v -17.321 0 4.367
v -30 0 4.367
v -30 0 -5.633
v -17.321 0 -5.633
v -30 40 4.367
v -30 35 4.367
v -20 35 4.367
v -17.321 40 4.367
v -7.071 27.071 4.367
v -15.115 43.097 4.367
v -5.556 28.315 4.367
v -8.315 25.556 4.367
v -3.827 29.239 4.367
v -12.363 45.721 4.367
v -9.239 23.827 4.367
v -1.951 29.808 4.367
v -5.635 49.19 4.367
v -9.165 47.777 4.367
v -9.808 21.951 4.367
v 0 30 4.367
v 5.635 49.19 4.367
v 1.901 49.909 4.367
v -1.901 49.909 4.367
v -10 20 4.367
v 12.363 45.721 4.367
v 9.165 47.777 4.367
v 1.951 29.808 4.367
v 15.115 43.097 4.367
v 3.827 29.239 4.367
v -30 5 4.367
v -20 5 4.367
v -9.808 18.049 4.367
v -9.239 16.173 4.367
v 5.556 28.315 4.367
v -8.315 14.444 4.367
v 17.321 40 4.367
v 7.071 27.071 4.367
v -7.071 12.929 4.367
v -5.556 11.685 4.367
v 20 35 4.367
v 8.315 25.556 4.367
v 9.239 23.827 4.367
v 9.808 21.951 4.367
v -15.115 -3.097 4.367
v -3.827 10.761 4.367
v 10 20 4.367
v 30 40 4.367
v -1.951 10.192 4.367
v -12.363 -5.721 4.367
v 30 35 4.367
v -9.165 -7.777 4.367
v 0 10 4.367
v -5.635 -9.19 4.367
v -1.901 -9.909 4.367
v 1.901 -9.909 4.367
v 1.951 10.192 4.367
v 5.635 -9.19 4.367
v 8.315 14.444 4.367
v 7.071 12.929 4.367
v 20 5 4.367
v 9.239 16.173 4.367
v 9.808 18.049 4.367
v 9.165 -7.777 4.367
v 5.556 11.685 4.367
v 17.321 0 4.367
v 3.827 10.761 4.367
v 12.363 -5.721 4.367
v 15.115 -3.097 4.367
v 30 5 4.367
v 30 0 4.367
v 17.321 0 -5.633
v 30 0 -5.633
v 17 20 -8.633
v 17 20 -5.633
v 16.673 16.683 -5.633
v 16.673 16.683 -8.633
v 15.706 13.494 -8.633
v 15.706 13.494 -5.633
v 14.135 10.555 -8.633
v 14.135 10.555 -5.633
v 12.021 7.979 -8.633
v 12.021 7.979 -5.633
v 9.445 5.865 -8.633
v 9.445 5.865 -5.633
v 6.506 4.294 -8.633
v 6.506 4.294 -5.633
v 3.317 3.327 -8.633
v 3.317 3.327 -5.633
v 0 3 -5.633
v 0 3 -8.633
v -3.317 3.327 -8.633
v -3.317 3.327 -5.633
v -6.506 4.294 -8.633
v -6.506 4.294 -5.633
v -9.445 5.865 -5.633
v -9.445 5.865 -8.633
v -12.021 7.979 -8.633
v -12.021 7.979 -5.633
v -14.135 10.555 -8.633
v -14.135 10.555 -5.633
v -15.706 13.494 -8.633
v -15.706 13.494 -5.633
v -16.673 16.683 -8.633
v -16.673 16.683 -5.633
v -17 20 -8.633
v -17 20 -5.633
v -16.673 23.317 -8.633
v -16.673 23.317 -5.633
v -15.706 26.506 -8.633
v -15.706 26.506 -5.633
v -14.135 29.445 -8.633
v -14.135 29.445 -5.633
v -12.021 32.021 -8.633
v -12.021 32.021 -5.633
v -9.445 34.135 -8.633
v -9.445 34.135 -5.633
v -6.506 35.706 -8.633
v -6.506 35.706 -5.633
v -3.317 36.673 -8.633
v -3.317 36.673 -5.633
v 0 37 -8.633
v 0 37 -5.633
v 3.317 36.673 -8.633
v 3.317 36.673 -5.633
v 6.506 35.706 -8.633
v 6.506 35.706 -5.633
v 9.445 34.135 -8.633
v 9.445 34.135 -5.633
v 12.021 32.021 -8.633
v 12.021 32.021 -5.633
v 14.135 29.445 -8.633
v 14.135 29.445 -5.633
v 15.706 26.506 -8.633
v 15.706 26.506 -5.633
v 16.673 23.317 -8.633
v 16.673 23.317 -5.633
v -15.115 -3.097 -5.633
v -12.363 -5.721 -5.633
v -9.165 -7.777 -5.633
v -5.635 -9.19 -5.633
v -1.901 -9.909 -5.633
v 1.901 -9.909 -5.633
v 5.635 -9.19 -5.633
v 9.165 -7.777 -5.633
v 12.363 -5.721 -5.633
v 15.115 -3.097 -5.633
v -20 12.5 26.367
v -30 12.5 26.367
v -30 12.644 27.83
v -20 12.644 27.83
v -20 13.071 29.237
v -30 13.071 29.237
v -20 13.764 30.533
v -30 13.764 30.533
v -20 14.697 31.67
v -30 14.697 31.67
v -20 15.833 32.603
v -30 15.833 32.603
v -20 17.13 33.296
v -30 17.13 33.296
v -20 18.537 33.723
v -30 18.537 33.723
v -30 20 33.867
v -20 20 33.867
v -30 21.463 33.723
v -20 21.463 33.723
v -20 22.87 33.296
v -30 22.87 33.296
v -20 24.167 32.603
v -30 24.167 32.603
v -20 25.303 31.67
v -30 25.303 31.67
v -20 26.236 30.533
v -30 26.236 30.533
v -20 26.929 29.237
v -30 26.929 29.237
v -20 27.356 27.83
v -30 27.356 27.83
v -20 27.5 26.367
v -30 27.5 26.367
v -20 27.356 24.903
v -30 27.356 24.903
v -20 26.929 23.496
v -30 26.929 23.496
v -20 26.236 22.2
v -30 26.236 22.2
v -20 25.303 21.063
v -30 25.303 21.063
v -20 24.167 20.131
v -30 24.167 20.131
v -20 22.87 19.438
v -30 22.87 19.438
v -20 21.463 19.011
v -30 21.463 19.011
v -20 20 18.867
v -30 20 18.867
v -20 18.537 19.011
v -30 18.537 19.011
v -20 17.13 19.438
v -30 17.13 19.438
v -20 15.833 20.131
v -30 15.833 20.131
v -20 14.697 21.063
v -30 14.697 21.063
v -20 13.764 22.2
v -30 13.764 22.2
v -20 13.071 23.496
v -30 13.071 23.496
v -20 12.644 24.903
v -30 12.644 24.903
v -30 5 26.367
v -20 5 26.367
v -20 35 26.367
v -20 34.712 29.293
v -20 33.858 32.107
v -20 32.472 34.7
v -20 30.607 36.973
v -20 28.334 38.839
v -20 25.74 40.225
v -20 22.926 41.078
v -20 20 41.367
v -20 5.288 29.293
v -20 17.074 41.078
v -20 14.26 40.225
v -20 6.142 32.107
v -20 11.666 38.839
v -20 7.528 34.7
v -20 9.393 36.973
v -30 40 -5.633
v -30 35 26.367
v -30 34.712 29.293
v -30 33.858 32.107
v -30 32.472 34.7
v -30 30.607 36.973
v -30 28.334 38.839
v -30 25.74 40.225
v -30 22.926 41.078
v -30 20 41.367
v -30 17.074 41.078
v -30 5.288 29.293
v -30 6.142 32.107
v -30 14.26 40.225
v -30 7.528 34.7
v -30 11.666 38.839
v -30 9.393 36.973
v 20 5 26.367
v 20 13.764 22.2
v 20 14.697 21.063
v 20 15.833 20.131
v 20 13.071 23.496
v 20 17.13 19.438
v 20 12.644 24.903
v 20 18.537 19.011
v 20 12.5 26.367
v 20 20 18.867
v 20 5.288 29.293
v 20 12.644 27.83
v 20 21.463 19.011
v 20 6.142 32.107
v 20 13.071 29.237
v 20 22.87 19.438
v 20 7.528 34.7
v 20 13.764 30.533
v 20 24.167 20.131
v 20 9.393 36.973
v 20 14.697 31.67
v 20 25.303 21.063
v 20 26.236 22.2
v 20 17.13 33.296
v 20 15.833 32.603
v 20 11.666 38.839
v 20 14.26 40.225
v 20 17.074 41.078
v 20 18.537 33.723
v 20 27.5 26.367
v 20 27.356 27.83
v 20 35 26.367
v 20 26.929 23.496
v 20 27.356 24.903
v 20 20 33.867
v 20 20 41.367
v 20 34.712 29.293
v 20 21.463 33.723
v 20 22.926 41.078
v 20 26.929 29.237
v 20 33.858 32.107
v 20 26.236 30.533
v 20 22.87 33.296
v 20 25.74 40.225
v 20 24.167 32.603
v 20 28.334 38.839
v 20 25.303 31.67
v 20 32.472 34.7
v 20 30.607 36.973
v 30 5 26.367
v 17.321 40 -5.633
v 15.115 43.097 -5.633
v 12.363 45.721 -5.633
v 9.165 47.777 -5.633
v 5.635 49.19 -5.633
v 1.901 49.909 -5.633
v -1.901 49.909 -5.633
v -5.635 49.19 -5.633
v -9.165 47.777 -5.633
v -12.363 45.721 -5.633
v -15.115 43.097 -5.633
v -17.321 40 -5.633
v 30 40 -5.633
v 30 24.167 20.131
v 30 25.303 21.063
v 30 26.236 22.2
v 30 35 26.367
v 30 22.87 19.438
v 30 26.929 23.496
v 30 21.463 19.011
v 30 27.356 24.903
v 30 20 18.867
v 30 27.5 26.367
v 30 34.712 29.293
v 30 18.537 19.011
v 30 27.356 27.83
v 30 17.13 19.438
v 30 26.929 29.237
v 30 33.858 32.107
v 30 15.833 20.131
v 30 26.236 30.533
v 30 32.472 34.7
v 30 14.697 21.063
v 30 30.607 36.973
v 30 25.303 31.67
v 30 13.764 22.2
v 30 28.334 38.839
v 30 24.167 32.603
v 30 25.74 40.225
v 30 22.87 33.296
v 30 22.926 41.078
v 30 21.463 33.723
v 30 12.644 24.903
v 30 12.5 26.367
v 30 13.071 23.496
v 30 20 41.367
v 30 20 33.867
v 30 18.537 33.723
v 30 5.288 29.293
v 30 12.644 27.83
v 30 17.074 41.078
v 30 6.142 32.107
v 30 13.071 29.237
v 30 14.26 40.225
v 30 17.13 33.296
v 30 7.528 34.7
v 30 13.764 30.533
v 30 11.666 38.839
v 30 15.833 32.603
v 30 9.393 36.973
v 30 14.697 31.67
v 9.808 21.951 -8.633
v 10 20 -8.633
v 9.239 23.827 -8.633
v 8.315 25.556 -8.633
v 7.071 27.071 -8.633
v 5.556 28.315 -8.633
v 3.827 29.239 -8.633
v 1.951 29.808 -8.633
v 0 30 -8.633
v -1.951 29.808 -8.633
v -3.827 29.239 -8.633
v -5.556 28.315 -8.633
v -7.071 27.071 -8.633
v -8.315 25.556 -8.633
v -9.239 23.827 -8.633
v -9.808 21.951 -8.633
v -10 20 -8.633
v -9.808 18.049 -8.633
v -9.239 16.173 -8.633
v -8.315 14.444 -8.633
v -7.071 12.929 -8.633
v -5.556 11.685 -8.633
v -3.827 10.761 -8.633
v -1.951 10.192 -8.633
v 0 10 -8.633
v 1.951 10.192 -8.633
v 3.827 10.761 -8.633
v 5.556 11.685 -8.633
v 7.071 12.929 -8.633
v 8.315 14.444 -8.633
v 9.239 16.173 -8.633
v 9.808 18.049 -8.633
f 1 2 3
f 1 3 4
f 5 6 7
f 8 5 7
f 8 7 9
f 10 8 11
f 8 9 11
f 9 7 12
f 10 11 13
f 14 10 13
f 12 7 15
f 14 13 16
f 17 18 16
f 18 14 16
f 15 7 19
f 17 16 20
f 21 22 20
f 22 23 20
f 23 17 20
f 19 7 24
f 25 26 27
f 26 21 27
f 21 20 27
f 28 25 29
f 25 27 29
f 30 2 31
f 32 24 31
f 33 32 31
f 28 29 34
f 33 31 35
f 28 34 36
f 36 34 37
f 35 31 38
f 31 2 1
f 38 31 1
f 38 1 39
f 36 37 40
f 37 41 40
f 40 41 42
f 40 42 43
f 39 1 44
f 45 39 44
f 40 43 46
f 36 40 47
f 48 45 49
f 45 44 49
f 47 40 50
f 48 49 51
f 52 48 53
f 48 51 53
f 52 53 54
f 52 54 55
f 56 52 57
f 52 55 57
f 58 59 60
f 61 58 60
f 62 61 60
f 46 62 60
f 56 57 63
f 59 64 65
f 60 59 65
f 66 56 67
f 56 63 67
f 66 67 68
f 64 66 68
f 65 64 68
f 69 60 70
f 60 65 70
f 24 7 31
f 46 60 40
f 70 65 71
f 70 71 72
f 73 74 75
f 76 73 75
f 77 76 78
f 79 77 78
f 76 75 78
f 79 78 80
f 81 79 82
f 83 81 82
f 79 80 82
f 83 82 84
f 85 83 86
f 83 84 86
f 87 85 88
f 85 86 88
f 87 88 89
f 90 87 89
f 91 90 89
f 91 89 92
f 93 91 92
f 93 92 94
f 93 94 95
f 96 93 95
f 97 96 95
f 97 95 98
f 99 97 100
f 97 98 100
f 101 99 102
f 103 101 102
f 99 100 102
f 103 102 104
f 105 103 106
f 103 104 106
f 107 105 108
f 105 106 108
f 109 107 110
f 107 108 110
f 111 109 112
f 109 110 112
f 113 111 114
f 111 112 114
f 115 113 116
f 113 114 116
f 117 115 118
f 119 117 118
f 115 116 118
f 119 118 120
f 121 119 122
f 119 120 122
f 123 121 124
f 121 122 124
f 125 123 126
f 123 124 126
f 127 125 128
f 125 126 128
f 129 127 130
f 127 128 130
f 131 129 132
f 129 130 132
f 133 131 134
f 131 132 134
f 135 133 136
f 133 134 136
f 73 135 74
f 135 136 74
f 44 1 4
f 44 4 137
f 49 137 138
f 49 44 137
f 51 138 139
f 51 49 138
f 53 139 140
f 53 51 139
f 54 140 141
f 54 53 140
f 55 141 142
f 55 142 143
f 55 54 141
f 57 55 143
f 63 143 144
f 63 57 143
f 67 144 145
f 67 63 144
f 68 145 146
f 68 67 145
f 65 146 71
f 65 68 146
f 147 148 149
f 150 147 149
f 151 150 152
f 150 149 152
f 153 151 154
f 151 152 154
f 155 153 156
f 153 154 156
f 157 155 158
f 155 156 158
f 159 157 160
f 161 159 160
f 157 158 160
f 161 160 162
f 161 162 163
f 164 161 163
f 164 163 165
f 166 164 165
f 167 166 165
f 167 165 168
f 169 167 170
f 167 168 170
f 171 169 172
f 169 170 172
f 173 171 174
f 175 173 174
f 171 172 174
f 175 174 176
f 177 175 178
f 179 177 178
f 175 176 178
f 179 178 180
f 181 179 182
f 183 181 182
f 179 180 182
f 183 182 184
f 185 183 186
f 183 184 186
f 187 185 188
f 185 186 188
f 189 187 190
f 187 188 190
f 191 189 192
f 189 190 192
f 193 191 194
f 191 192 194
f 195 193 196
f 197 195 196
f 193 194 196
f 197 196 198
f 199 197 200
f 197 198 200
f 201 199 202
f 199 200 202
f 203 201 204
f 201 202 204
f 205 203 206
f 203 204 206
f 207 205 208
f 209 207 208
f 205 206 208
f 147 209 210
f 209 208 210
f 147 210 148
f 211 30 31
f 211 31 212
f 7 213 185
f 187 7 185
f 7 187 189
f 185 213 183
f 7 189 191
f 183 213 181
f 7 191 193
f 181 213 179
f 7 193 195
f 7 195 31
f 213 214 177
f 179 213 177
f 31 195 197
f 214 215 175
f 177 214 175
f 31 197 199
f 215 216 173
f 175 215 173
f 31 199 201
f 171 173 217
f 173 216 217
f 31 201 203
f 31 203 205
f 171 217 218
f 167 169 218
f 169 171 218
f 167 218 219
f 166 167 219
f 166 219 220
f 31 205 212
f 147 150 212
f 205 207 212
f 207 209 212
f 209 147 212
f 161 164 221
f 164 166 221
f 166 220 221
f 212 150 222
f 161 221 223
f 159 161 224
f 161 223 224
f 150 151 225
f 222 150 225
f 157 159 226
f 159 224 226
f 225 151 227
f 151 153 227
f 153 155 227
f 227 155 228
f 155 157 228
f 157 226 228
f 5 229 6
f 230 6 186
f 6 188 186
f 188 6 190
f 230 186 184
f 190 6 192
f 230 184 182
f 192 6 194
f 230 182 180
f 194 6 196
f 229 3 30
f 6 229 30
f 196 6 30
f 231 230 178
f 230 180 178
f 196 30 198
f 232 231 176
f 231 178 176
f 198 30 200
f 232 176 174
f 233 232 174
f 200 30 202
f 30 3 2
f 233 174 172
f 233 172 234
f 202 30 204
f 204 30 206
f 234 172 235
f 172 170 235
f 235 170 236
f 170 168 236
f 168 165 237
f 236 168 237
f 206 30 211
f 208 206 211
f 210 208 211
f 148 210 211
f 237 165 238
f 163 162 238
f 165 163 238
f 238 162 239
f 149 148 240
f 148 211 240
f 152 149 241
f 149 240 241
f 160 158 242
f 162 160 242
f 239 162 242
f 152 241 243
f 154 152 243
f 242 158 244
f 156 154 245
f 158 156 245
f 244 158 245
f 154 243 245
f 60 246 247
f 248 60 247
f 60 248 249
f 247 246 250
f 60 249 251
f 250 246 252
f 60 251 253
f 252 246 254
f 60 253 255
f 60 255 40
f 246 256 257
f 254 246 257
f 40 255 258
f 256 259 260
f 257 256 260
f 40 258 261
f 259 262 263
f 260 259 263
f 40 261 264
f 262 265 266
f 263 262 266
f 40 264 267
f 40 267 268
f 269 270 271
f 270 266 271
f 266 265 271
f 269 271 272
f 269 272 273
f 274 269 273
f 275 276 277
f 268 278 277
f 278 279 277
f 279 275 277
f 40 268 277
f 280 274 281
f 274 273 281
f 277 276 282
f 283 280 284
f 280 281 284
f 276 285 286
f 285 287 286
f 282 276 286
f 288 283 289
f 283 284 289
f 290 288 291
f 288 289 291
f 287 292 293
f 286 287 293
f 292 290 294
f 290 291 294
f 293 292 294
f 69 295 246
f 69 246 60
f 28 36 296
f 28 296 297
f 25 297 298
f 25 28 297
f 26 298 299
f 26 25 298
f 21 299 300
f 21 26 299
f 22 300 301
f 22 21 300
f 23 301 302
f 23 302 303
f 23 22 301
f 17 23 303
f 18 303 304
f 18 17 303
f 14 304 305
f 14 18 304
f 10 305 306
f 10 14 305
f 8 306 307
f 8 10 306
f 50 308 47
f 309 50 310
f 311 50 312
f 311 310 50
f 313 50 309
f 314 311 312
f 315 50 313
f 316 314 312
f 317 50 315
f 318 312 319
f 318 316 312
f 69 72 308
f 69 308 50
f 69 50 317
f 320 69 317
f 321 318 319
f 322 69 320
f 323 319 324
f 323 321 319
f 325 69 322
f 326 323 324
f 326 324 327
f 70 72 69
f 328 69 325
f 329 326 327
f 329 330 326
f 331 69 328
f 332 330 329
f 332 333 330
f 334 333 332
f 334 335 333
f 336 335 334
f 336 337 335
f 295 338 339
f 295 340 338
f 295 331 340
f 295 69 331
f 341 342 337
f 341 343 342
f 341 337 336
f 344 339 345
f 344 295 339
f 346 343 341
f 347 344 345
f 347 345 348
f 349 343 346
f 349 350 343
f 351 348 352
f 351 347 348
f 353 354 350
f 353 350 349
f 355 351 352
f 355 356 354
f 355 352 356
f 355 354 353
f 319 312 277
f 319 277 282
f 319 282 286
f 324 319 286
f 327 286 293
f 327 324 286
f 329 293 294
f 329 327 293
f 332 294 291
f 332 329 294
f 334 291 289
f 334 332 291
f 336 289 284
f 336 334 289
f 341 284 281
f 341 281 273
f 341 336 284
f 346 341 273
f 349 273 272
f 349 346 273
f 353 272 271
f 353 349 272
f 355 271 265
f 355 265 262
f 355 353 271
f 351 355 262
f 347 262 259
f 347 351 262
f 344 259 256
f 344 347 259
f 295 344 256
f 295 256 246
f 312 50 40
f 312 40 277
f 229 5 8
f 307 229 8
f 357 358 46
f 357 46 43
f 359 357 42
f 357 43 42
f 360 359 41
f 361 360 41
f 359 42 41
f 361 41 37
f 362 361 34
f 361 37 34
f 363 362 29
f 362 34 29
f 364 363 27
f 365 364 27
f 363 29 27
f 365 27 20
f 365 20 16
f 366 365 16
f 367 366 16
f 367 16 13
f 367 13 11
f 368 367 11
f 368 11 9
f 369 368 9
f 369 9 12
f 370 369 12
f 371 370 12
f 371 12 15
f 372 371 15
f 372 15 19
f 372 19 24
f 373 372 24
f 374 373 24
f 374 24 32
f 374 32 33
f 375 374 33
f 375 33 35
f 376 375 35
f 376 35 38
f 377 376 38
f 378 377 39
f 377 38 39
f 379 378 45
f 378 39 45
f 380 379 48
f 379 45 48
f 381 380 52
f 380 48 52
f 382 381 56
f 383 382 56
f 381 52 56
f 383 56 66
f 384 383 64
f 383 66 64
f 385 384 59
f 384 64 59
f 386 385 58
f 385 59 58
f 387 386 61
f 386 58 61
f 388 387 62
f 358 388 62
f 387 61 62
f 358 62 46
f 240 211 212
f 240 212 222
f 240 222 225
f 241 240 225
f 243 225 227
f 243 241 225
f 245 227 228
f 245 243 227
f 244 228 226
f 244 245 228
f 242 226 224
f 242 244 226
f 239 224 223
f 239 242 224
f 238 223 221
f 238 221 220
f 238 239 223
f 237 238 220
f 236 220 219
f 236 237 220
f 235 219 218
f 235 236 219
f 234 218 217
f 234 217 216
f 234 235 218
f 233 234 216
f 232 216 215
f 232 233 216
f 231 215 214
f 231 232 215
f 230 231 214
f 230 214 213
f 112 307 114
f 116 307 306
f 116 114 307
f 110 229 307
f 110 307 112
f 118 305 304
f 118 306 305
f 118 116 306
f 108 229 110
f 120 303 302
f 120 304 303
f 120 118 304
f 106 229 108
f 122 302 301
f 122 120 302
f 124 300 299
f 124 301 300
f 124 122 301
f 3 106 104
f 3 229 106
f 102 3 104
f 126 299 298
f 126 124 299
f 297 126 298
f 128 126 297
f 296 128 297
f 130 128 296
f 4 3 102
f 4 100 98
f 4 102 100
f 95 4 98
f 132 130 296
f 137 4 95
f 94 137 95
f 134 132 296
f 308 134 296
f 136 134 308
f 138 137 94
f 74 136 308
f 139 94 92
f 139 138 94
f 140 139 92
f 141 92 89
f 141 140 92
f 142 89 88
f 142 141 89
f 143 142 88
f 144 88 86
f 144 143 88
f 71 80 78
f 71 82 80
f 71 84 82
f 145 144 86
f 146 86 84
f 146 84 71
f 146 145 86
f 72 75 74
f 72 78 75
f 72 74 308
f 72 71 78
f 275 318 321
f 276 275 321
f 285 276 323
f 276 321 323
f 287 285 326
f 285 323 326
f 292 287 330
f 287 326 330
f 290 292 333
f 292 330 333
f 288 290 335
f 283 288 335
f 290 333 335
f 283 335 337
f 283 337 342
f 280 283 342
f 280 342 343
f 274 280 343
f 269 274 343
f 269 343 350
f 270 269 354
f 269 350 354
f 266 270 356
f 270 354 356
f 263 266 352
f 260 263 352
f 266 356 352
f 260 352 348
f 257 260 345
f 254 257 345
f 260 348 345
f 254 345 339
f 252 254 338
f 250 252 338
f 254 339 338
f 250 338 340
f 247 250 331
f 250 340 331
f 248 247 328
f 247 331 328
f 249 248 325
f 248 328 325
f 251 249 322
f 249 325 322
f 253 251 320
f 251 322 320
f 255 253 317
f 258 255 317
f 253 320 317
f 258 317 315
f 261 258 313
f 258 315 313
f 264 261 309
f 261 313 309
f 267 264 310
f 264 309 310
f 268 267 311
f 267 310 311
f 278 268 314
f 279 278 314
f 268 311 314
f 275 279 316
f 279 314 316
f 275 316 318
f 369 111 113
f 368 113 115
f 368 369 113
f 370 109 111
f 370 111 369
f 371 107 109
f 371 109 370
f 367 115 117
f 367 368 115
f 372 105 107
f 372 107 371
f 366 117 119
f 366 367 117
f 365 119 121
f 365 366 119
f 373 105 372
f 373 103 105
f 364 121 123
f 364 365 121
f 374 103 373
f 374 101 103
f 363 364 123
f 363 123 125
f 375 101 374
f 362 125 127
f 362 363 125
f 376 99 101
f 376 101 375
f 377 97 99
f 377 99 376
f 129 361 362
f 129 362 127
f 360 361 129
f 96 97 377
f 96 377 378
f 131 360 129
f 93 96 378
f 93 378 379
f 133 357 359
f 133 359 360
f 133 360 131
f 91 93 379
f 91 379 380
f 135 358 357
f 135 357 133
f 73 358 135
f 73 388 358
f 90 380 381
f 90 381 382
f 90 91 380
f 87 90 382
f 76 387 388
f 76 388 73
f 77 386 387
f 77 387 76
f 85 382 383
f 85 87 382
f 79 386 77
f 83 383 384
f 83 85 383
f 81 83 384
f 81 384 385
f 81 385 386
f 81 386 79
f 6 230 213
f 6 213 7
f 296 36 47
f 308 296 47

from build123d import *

# Parameters (mm, degrees)
F0_W      = 60
F0_H      = 10
F1_DEPTH  = 40
F2_R      = 7.5
F3_DEPTH  = 10
F4_R      = 7.5
F5_DEPTH  = 10
F6_R      = 17
F7_DEPTH  = 3
F8_R      = 10
F9_DEPTH  = 25
F11_DEPTH = 10


with BuildPart() as f1:
    # F0 (on Front) → F1 (new body)
    with BuildSketch(Plane.XZ):
        with Locations((0, -0.633379)):
            Rectangle(F0_W, F0_H)
    extrude(amount=-F1_DEPTH)

    # F2 (on face) → F3 (join)
    with BuildSketch(Plane.YZ.offset(30)):
        with BuildLine():
            Line((5, 26.366621), (5, 4.366621))
            Line((5, 4.366621), (35, 4.366621))
            Line((35, 4.366621), (35, 26.366621))
            ThreePointArc((35, 26.366621), (20, 41.366621), (5, 26.366621))
        make_face()
        with Locations((20, 26.366621)):
            Circle(F2_R, mode=Mode.SUBTRACT)
    extrude(amount=-F3_DEPTH)

    # F4 (on face) → F5 (join)
    with BuildSketch(Plane(origin=(-30, 0, 0), x_dir=(0, -1, 0), z_dir=(-1, 0, 0))):
        with BuildLine():
            Line((-35, 4.366621), (-5, 4.366621))
            Line((-5, 4.366621), (-5, 26.366621))
            ThreePointArc((-5, 26.366621), (-20, 41.366621), (-35, 26.366621))
            Line((-35, 26.366621), (-35, 4.366621))
        make_face()
        with Locations((-20, 26.366621)):
            Circle(F4_R, mode=Mode.SUBTRACT)
    extrude(amount=-F5_DEPTH)

    # F6 (on face) → F7 (join)
    with BuildSketch(Plane(origin=(0, 0, -5.633379), x_dir=(1, 0, 0), z_dir=(0, 0, -1))):
        with Locations((0, -20)):
            Circle(F6_R)
    extrude(amount=F7_DEPTH)

    # F8 (on face) → F9 (cut)
    with BuildSketch(Plane.XY.offset(4.366621)):
        with Locations((0, 20)):
            Circle(F8_R)
    extrude(amount=-F9_DEPTH, mode=Mode.SUBTRACT)

    # F10 (on face) → F11 (join)
    with BuildSketch(Plane.XY.offset(4.366621)):
        with BuildLine():
            Line((17.320508, 0), (-17.320508, 0))
            ThreePointArc((-17.320508, 0), (0, -10), (17.320508, 0))
        make_face()
        with BuildLine():
            Line((-17.320508, 40), (17.320508, 40))
            ThreePointArc((17.320508, 40), (0, 50), (-17.320508, 40))
        make_face()
    extrude(amount=-F11_DEPTH)


solid = f1.part
